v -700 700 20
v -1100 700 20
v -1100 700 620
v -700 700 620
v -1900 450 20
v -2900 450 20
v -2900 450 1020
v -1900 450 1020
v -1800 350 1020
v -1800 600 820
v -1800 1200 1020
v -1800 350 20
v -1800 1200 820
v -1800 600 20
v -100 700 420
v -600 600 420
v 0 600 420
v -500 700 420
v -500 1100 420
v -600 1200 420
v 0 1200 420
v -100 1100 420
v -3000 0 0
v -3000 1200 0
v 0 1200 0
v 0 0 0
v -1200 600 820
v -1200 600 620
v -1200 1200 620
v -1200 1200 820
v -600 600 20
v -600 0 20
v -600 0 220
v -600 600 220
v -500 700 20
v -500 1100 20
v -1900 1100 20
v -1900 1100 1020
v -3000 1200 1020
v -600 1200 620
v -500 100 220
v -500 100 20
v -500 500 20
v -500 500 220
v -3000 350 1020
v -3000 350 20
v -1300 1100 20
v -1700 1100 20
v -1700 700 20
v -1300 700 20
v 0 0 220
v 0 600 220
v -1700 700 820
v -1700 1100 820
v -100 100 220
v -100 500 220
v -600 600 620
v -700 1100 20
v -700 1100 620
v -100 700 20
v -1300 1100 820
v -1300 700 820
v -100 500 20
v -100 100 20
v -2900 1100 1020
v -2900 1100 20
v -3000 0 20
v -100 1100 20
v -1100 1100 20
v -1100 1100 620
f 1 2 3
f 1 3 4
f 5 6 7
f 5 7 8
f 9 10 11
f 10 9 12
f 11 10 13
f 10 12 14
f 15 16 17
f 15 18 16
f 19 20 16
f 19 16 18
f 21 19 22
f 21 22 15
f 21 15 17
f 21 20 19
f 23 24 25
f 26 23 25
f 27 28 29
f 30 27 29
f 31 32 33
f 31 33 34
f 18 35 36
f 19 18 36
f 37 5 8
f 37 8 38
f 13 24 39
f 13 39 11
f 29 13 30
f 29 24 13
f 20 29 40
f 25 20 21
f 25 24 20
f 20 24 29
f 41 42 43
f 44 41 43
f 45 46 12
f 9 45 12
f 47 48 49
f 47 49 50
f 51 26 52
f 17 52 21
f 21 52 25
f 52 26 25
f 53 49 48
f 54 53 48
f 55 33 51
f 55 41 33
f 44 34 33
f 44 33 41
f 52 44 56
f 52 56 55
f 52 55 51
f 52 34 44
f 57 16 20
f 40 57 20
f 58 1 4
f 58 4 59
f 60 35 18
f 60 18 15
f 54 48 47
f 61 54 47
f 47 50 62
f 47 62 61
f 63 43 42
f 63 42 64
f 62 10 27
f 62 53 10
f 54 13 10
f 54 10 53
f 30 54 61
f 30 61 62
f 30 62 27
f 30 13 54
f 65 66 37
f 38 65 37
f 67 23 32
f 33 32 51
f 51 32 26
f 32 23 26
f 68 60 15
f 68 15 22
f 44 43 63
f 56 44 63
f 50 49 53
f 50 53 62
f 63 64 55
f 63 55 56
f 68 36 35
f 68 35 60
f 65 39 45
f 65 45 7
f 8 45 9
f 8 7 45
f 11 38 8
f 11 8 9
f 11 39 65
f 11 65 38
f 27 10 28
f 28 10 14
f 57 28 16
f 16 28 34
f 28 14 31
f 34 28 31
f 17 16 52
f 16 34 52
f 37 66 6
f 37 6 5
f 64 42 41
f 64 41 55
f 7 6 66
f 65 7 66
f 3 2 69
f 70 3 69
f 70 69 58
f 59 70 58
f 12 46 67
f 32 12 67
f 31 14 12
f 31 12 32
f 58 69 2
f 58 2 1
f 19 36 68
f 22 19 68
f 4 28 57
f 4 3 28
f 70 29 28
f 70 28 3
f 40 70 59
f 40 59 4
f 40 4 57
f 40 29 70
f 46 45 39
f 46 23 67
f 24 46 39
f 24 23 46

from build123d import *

# Parameters (mm, degrees)
F1_DEPTH  = 20
F2_W      = 600
F2_H      = 600
F2_W_2    = 400
F2_H_2    = 400
F3_DEPTH  = 400
F4_W      = 600
F4_H      = 600
F4_W_2    = 400
F4_H_2    = 400
F5_DEPTH  = 600
F6_W      = 600
F6_H      = 600
F6_W_2    = 400
F6_H_2    = 400
F7_DEPTH  = 800
F8_W      = 1200
F8_H      = 850
F8_W_2    = 1000
F8_H_2    = 650
F9_DEPTH  = 1000
F10_W     = 600
F10_H     = 600
F10_W_2   = 400
F10_H_2   = 400
F11_DEPTH = 200


with BuildPart() as f1:
    # F0 (on Top) → F1 (new body)
    with BuildSketch(Plane.XY):
        Polygon((-2563.636364, 0), (0, 0), (0, 1200), (-3000, 1200), (-3000, 0), align=None)
    extrude(amount=F1_DEPTH)

    # F2 (on face) → F3 (join)
    with BuildSketch(Plane.XY.offset(20)):
        with Locations((-300, 900)):
            Rectangle(F2_W, F2_H)
        with Locations((-300, 900)):
            Rectangle(F2_W_2, F2_H_2, mode=Mode.SUBTRACT)
    extrude(amount=F3_DEPTH)

    # F4 (on face) → F5 (join)
    with BuildSketch(Plane.XY.offset(20)):
        with Locations((-900, 900)):
            Rectangle(F4_W, F4_H)
        with Locations((-900, 900)):
            Rectangle(F4_W_2, F4_H_2, mode=Mode.SUBTRACT)
    extrude(amount=F5_DEPTH)

    # F6 (on face) → F7 (join)
    with BuildSketch(Plane.XY.offset(20)):
        with Locations((-1500, 900)):
            Rectangle(F6_W, F6_H)
        with Locations((-1500, 900)):
            Rectangle(F6_W_2, F6_H_2, mode=Mode.SUBTRACT)
    extrude(amount=F7_DEPTH)

    # F8 (on face) → F9 (join)
    with BuildSketch(Plane.XY.offset(20)):
        with Locations((-2400, 775)):
            Rectangle(F8_W, F8_H)
        with Locations((-2400, 775)):
            Rectangle(F8_W_2, F8_H_2, mode=Mode.SUBTRACT)
    extrude(amount=F9_DEPTH)

    # F10 (on face) → F11 (join)
    with BuildSketch(Plane.XY.offset(20)):
        with Locations((-300, 300)):
            Rectangle(F10_W, F10_H)
        with Locations((-300, 300)):
            Rectangle(F10_W_2, F10_H_2, mode=Mode.SUBTRACT)
    extrude(amount=F11_DEPTH)


solid = f1.part
